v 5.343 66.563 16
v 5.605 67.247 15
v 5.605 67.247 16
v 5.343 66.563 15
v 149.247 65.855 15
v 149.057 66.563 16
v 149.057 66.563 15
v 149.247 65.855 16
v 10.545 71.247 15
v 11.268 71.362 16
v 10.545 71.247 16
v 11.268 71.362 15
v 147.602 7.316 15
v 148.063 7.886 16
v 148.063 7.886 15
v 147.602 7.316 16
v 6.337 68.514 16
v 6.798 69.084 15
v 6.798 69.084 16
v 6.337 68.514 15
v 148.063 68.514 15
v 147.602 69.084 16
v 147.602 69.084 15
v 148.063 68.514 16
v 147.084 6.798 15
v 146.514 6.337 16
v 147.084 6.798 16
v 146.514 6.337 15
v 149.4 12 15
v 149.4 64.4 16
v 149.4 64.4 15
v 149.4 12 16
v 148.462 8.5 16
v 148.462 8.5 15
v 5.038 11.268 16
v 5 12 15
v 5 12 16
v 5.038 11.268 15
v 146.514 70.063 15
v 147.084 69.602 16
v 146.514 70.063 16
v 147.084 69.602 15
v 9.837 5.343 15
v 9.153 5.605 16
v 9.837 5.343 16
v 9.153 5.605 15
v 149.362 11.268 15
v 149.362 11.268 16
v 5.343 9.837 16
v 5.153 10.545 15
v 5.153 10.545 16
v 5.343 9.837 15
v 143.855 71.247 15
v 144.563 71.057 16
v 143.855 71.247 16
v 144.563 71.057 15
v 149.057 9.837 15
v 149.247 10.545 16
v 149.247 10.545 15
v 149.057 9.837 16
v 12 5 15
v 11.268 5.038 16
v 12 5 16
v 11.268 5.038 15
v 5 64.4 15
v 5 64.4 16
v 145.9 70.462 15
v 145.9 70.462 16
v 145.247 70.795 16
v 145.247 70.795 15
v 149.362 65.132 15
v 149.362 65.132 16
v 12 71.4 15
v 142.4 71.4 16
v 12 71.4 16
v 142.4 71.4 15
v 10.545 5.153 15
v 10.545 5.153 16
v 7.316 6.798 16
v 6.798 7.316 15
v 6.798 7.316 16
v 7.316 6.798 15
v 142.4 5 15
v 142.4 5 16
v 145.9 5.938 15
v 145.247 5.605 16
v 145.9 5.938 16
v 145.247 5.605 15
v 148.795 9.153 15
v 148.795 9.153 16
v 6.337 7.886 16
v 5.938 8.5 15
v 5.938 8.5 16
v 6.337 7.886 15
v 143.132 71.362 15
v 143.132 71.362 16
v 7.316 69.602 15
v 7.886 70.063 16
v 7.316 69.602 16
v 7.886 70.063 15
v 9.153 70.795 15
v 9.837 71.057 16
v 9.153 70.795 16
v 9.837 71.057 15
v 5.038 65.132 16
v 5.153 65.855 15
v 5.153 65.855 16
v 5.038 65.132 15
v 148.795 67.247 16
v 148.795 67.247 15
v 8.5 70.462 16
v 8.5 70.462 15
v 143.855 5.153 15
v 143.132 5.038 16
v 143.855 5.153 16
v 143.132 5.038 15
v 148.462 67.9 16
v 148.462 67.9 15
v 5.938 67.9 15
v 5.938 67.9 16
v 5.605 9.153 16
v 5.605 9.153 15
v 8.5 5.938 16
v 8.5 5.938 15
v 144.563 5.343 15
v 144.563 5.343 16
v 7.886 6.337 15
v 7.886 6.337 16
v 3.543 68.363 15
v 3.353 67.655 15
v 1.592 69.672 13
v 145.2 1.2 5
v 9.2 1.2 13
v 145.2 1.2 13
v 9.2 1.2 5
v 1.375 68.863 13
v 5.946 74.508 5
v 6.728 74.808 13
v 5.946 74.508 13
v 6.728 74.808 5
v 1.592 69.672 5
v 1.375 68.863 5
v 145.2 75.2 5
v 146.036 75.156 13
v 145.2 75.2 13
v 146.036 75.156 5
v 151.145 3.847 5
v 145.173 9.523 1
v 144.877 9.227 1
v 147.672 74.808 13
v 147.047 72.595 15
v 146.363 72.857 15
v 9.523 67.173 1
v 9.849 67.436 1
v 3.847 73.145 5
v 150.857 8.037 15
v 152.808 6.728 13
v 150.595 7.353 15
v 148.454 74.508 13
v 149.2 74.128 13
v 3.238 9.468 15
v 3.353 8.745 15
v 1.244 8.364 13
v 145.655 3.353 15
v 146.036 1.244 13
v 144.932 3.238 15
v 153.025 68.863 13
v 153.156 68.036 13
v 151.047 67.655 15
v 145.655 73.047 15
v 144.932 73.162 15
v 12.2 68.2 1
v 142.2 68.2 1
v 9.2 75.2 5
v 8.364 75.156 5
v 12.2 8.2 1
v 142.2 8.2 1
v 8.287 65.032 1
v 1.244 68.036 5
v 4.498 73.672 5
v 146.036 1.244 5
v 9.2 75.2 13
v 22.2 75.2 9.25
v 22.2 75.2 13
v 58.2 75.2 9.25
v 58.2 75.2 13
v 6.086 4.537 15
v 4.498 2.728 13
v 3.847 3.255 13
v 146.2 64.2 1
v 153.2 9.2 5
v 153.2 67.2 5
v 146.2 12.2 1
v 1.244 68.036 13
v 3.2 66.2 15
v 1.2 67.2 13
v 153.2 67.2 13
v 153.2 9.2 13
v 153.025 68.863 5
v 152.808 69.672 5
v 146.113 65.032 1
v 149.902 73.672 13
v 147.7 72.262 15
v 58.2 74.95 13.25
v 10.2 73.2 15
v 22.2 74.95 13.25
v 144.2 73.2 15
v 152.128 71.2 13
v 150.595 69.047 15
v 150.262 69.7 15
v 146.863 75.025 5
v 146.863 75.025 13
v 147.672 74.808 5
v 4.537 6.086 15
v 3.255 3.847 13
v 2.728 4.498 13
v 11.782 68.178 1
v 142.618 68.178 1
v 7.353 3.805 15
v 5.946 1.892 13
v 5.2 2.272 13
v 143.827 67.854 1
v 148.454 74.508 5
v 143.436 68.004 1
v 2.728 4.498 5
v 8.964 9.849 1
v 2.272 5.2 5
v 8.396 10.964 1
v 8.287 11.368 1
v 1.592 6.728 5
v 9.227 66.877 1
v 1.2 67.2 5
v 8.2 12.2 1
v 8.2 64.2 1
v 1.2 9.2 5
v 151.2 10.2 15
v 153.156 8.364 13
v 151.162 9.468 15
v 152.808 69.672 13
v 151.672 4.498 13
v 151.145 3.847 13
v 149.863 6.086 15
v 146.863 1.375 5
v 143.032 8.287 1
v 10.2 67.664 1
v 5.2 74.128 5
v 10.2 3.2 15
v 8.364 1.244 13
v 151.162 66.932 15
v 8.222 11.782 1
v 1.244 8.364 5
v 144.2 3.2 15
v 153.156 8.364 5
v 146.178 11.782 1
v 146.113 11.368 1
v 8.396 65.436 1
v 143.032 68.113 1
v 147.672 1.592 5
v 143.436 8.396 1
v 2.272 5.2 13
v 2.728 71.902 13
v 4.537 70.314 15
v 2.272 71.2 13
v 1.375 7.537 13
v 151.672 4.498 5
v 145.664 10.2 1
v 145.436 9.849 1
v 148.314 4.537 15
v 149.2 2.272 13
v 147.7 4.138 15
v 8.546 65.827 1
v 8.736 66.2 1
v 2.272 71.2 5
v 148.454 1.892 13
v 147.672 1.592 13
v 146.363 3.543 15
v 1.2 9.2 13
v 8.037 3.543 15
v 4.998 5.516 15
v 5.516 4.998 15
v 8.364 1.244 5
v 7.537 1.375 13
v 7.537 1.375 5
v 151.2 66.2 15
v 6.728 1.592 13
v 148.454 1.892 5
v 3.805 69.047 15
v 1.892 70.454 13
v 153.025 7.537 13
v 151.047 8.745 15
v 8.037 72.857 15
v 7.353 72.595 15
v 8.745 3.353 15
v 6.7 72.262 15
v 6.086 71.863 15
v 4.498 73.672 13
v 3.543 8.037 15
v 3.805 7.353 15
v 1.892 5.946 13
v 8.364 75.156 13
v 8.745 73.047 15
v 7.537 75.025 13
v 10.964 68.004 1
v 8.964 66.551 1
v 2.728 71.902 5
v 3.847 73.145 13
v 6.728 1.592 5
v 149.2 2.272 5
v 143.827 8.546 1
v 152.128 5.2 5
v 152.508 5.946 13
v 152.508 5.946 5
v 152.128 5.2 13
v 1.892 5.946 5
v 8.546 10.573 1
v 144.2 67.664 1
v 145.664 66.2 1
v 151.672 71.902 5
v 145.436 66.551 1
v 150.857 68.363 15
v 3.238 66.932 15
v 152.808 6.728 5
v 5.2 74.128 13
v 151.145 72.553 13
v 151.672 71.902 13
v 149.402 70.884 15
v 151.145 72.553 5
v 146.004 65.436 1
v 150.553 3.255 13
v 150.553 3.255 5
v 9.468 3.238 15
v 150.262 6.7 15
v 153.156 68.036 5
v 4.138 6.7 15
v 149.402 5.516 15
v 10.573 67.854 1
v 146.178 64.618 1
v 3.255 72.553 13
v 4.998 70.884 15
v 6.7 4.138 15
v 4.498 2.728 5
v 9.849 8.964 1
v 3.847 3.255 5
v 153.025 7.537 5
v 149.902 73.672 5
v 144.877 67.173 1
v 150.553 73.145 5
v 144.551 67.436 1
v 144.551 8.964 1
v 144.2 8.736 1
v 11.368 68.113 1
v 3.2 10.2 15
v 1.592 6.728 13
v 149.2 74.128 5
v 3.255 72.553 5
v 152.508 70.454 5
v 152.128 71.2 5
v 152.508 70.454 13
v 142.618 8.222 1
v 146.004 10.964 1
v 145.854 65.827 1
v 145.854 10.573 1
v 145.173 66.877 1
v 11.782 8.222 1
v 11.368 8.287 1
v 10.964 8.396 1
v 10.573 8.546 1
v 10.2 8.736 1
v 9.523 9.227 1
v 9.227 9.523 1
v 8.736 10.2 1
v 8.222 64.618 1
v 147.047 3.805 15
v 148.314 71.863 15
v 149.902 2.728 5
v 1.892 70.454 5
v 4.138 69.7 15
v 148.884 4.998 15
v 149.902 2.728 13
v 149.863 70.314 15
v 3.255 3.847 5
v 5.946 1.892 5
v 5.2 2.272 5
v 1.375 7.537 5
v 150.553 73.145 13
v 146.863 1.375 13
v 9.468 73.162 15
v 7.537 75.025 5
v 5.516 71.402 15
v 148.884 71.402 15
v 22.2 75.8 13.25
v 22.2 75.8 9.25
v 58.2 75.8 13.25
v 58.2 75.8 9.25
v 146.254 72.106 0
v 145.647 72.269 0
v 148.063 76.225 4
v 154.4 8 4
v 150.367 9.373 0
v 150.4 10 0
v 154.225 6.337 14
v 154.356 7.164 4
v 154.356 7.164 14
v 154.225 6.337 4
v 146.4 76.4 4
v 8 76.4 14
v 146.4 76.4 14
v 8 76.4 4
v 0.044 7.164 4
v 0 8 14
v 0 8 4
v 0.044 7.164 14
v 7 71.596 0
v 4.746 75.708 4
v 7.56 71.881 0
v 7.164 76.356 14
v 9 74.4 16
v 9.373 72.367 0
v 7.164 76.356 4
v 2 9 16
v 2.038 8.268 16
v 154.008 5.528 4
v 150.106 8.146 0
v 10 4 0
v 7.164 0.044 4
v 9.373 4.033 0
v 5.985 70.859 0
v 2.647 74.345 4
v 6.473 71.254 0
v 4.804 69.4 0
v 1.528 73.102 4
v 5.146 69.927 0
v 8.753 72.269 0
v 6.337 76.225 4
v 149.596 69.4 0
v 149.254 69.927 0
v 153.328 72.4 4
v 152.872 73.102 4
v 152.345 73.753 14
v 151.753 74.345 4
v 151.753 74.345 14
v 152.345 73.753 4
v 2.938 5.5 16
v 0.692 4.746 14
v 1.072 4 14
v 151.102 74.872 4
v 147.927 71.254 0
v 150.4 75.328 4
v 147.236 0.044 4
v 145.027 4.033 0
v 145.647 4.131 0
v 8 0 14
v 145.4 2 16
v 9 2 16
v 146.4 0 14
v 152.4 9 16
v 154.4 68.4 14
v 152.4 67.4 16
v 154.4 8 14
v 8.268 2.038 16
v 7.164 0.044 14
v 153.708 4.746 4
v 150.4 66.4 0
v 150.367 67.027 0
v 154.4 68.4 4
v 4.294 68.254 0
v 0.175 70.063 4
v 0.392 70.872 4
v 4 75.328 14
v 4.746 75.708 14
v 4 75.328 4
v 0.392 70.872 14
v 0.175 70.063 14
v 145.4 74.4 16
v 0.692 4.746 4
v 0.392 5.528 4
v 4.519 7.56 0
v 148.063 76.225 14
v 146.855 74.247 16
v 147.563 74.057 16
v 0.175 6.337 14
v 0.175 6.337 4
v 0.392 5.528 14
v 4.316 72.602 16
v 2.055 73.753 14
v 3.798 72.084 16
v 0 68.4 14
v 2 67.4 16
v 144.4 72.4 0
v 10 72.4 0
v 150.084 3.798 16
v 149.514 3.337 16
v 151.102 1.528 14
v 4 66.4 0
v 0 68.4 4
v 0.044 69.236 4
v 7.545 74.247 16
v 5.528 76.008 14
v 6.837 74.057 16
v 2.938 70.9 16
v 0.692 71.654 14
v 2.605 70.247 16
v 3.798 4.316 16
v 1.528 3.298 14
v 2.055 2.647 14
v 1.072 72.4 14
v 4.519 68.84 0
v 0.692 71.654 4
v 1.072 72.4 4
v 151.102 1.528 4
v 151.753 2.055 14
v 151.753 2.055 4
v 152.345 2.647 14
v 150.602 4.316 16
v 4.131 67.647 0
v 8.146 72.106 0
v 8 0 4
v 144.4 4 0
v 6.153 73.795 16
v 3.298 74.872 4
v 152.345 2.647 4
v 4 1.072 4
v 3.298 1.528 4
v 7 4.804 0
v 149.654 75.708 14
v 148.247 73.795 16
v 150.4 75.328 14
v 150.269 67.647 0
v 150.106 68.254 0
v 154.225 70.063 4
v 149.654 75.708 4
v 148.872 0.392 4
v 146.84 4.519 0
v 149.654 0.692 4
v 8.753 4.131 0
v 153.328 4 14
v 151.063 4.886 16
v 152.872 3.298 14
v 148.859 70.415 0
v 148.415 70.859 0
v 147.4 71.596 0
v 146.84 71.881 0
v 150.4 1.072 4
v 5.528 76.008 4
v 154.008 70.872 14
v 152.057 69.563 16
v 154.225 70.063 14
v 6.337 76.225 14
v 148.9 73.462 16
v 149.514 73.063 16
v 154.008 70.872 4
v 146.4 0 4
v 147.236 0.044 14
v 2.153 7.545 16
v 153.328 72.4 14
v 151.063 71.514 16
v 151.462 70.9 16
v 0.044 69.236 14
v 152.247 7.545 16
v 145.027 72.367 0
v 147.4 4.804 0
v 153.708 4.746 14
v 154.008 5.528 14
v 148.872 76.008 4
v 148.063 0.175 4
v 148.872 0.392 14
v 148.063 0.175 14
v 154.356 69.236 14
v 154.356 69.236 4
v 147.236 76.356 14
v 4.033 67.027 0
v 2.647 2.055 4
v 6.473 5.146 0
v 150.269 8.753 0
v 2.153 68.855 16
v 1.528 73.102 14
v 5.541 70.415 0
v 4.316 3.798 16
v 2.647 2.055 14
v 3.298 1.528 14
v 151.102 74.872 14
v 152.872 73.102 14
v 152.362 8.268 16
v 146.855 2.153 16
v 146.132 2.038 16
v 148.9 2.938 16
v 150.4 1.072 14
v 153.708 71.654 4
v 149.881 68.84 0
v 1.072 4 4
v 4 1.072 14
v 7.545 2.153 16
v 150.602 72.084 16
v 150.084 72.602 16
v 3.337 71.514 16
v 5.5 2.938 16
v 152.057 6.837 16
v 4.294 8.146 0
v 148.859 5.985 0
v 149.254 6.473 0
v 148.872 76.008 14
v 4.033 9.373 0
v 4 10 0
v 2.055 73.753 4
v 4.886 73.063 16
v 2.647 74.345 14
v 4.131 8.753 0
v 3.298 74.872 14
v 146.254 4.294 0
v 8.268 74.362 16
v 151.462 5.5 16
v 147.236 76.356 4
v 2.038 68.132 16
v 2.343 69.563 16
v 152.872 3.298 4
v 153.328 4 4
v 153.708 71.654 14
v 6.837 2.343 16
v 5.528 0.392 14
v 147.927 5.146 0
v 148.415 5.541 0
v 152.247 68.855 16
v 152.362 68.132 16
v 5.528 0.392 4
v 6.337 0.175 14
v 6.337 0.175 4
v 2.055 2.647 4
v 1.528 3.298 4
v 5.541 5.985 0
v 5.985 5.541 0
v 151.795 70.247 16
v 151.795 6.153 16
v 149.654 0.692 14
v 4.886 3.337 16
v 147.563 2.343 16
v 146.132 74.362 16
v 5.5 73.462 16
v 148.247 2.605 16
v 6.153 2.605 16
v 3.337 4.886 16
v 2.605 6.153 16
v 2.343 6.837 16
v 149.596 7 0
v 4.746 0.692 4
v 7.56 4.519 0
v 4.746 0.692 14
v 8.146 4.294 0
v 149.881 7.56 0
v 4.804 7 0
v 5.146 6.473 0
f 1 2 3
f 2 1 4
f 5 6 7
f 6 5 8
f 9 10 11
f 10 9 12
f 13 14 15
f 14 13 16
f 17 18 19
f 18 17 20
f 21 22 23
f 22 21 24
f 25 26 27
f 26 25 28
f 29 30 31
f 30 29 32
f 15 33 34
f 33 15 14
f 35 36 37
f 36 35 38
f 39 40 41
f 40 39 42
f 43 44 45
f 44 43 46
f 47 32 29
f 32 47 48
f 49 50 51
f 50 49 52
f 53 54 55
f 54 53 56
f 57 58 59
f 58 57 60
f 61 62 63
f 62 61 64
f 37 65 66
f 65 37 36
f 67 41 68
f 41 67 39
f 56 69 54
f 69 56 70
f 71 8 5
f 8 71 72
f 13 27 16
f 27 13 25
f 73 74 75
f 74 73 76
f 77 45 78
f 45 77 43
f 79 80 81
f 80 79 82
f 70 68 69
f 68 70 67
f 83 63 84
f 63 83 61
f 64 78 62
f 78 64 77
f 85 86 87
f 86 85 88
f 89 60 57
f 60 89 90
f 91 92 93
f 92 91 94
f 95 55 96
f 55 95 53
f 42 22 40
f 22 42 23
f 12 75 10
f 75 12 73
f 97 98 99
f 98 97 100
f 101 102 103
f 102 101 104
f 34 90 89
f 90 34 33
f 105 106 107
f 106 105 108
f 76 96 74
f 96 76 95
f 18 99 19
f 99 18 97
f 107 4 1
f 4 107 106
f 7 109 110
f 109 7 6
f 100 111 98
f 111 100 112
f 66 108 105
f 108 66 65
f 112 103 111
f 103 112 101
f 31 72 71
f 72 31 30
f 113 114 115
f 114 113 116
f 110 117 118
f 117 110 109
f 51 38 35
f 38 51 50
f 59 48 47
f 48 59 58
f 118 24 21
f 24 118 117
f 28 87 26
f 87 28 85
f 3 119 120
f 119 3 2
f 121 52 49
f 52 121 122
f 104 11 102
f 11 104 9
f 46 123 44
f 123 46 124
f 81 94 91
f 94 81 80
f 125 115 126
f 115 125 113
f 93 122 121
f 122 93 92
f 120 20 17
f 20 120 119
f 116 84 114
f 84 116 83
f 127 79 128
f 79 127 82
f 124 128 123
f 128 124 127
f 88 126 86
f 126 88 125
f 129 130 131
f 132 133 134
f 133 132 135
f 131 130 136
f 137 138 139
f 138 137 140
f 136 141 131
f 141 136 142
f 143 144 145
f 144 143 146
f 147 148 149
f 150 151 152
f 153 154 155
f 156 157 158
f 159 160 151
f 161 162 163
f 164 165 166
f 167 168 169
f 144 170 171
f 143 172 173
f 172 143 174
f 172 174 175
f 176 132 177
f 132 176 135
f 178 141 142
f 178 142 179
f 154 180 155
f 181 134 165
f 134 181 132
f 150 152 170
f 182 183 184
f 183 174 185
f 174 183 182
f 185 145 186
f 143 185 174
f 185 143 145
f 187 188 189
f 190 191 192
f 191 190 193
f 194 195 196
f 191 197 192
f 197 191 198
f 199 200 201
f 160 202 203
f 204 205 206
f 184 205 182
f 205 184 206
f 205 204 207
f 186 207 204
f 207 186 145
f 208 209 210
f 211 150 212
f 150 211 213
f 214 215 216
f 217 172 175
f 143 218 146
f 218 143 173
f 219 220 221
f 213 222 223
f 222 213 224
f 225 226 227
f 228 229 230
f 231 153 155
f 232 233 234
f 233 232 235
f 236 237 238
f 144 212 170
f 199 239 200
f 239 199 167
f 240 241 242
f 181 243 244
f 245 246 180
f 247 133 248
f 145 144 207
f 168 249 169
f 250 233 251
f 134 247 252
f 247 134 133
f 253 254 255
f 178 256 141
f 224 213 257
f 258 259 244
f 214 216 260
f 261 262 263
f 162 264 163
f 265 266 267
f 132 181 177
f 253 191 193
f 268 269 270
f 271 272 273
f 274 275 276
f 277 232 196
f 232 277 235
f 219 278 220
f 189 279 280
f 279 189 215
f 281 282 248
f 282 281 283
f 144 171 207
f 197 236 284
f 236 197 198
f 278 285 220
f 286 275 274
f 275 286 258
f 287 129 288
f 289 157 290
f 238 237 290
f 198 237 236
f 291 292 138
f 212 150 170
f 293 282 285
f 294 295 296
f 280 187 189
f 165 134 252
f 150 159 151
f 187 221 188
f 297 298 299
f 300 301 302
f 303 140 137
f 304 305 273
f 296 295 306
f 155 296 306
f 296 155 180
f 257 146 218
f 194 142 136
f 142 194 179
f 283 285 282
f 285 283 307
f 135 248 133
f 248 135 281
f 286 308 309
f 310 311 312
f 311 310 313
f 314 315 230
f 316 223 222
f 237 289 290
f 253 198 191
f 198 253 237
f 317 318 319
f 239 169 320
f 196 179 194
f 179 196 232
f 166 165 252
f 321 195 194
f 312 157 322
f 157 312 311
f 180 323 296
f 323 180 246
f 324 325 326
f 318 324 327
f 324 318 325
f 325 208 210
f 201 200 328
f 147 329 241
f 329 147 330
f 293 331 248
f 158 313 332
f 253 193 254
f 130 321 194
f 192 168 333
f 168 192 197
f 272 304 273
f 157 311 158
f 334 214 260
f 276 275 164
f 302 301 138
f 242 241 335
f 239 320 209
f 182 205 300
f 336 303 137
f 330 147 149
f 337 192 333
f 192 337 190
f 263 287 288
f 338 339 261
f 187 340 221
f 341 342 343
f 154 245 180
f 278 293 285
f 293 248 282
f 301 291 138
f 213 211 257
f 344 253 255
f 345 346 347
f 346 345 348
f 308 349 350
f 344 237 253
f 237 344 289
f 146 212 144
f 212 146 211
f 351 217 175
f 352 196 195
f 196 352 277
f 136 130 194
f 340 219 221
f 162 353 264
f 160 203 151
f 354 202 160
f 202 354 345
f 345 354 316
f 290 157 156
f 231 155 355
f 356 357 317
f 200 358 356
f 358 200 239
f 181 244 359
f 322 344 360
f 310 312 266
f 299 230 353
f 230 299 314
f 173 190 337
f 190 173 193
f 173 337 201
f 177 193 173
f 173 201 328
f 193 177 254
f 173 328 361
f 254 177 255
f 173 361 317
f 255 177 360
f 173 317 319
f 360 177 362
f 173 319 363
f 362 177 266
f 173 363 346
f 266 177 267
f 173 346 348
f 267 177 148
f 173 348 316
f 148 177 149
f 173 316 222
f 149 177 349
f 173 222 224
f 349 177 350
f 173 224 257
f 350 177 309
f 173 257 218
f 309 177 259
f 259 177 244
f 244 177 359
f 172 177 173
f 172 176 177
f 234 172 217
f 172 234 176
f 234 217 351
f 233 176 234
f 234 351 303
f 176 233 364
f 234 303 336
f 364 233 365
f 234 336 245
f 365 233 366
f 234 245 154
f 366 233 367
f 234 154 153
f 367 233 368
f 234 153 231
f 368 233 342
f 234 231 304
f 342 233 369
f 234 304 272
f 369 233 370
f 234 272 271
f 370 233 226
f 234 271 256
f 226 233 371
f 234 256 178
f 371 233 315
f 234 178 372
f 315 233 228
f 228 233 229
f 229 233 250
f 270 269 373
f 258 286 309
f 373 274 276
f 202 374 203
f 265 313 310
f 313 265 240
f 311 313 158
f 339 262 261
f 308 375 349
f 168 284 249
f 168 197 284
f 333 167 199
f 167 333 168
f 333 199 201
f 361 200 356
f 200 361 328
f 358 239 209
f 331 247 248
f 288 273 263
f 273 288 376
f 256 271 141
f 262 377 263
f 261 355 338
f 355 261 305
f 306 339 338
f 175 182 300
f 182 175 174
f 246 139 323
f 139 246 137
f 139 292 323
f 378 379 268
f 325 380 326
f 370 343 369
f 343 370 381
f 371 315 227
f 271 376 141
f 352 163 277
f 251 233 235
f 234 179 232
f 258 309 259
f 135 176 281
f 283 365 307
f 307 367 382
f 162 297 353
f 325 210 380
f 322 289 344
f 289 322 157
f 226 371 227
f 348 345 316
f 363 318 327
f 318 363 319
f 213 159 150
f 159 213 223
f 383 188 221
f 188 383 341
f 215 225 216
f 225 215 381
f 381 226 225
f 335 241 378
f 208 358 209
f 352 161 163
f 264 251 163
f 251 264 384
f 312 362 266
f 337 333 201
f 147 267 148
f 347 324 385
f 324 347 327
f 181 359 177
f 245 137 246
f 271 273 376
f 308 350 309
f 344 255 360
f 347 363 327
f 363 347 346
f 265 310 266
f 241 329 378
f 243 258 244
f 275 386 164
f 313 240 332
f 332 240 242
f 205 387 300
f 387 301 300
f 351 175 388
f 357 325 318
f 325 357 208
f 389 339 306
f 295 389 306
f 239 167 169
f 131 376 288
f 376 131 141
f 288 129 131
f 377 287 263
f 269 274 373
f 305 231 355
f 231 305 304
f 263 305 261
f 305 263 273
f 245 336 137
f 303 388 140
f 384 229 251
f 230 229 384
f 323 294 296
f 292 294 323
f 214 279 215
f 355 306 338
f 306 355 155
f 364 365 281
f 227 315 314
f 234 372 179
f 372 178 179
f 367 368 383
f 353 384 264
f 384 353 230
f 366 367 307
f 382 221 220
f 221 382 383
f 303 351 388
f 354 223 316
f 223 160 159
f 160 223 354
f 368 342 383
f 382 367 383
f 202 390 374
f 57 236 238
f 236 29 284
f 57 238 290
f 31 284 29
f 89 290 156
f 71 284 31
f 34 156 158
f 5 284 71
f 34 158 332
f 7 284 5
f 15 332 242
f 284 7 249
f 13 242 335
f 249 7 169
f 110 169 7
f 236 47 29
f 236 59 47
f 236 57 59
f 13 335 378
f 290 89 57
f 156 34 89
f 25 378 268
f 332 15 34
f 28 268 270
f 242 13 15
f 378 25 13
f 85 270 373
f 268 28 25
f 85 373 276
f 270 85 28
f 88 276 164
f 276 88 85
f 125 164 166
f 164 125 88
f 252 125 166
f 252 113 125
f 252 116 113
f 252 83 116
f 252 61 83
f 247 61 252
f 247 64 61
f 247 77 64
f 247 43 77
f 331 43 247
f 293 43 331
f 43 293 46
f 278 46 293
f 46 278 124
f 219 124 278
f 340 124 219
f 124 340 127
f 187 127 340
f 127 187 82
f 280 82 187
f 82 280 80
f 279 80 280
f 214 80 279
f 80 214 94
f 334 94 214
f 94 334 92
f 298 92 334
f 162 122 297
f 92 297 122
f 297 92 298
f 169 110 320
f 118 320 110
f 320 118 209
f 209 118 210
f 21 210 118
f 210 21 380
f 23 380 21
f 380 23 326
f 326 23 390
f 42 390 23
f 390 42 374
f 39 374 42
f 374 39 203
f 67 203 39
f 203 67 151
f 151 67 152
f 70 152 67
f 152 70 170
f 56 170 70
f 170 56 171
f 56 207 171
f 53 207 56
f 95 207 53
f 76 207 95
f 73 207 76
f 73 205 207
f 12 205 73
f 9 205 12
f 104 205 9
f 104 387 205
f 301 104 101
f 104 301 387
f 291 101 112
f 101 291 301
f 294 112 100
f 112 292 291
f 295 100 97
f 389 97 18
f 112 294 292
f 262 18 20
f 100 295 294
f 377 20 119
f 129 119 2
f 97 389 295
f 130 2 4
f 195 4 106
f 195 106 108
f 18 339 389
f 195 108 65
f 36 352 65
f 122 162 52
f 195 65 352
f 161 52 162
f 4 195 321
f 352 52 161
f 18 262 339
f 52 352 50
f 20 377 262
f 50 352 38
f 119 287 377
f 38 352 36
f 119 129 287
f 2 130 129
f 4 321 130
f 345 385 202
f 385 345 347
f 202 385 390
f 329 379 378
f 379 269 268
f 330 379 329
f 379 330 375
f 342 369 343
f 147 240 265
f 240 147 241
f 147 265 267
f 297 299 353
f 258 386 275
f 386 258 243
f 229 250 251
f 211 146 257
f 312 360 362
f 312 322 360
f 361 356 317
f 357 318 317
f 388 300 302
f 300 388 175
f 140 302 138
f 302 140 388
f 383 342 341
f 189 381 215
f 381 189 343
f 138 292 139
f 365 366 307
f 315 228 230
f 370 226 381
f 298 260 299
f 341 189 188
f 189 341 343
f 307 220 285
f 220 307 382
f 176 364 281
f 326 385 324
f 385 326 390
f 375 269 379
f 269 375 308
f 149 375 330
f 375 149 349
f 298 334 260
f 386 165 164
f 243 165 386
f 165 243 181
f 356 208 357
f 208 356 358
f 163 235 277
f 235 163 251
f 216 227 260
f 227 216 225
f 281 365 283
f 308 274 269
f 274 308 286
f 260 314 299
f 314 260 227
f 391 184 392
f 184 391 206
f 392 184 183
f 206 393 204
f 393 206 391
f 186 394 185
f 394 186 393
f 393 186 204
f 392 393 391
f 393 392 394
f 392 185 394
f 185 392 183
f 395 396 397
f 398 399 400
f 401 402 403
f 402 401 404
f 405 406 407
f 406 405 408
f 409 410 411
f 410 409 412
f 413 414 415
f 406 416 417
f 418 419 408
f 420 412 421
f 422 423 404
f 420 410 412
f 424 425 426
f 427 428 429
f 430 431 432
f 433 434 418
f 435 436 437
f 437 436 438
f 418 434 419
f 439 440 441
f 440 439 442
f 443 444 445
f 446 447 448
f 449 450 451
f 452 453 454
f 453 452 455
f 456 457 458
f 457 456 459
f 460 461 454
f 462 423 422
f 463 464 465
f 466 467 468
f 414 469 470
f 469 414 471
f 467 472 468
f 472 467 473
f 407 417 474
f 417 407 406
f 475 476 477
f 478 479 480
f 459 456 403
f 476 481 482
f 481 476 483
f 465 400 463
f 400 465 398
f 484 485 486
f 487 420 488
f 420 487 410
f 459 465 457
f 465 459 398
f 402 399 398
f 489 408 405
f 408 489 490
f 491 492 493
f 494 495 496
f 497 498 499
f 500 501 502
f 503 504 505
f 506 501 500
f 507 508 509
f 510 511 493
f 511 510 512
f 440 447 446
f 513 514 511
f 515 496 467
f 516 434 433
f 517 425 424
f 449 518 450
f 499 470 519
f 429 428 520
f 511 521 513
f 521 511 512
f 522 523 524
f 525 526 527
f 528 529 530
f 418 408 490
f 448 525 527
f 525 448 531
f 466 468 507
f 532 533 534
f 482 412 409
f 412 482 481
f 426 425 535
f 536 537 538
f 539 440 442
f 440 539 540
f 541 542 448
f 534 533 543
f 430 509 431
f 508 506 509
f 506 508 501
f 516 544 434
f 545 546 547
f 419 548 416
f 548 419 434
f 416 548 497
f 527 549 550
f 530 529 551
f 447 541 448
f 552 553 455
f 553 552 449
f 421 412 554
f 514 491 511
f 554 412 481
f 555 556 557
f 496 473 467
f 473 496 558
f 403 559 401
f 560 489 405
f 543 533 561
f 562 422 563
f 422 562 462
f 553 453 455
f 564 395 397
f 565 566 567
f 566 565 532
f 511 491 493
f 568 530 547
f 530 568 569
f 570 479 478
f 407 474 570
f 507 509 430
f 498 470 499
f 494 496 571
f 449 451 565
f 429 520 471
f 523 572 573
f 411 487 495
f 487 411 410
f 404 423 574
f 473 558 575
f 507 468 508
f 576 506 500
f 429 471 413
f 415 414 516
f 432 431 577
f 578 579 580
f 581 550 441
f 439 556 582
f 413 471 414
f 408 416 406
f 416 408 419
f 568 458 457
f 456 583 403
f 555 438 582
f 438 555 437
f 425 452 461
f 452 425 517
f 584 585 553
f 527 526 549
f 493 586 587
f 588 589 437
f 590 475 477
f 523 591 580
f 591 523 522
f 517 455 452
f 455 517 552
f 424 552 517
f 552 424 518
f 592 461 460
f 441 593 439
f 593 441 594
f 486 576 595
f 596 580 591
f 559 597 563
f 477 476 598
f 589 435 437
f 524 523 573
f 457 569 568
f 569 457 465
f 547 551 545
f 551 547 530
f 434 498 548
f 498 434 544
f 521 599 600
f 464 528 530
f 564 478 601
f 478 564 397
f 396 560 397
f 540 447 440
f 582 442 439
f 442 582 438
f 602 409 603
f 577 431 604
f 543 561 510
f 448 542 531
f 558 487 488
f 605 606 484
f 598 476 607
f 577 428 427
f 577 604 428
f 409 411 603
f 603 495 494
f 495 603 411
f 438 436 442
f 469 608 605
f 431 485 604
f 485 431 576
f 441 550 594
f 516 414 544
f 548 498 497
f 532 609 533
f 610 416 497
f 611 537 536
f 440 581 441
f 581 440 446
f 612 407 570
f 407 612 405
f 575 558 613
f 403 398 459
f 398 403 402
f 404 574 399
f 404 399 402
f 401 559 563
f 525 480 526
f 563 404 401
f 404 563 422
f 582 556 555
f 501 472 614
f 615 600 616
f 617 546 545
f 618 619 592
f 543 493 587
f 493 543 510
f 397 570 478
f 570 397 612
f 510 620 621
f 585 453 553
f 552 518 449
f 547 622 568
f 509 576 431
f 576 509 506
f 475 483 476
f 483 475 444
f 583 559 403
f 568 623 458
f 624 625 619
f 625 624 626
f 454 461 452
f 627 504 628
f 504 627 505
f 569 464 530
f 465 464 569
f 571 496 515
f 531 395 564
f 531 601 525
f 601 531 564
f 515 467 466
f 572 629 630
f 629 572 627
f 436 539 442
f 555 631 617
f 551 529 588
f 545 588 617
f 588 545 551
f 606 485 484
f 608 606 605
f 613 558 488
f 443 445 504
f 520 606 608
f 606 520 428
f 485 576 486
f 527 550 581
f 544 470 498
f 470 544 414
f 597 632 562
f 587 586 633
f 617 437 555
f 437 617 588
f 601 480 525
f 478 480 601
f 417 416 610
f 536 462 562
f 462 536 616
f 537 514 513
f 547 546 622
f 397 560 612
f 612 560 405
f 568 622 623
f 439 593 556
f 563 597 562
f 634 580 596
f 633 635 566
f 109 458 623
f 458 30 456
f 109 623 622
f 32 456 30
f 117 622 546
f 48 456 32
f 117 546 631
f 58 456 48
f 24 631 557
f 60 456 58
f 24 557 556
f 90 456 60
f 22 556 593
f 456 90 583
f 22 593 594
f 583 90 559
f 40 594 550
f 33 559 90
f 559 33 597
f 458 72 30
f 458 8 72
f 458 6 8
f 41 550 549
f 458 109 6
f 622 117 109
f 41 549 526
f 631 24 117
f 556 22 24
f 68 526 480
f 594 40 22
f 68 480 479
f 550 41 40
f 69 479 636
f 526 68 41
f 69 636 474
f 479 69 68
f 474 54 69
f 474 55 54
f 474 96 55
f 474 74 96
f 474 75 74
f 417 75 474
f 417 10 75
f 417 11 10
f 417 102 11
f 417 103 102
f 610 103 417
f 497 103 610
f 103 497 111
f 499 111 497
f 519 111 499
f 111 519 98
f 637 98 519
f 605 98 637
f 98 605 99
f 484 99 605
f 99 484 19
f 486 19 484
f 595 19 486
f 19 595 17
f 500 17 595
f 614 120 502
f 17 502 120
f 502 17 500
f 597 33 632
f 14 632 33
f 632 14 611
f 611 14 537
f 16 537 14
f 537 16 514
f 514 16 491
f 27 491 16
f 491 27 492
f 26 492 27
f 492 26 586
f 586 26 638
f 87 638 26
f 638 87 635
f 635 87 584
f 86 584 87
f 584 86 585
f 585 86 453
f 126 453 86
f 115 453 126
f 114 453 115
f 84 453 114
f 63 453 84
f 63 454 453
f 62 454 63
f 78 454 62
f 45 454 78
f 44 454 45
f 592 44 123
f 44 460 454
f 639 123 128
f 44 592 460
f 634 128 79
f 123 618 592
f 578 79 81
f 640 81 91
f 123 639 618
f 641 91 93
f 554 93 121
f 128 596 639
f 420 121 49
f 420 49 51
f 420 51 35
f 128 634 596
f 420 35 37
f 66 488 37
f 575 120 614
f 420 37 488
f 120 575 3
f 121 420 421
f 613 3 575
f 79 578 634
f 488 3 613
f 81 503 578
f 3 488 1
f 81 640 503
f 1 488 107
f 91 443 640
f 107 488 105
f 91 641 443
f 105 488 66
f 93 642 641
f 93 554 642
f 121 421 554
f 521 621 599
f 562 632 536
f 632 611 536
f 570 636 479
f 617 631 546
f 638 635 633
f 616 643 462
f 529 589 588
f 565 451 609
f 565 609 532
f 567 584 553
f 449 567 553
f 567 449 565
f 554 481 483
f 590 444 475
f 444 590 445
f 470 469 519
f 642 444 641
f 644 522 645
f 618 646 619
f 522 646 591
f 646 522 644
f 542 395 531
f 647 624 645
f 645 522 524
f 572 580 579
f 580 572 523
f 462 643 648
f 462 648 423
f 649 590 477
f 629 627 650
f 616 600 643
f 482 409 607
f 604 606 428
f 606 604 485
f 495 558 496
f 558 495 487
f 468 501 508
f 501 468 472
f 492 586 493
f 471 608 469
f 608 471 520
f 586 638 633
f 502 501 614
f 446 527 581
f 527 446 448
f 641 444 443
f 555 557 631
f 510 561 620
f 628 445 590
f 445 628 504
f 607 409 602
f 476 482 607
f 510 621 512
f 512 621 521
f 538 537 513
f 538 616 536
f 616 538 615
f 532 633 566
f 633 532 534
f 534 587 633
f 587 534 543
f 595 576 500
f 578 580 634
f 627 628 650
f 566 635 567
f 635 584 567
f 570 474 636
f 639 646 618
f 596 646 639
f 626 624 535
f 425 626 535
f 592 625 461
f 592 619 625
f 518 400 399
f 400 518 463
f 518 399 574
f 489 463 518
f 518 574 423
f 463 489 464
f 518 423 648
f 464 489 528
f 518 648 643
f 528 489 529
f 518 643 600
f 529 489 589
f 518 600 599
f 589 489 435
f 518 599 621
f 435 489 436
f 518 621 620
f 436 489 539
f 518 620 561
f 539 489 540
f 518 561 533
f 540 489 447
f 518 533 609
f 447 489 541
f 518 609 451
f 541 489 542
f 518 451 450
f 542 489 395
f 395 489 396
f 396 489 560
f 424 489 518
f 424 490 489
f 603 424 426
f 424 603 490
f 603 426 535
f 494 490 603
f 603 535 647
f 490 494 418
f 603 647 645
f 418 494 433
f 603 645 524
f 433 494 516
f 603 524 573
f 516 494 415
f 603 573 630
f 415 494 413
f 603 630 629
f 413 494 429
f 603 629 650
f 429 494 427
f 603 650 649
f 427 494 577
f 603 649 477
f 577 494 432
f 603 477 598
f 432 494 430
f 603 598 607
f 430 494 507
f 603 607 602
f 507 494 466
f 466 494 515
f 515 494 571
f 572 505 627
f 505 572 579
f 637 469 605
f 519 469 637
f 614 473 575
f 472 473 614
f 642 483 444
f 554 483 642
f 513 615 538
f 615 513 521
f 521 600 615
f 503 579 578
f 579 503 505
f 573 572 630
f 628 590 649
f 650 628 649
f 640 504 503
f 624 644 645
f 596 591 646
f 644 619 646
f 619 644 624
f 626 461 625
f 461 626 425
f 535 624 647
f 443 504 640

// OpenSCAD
// file: PhoneOutline.scad
//
// Copyright (C) 2020 Purism SPC
//
// SPDX-License-Identifier: GPL-3.0+
//

// slim needs to be defined before including this file

// Phone Dimensions
pX = (evergreen == 1) ? 153-slim : 150-slim;
pY = 75-slim;
pZ = 15-slim;

module phone() {
    $fn=60;
    r=8;

    hull() {
    //Main phone
    translate([r,r,4])
        cylinder(h=pZ-6, r=r);
    translate([r,pY-r,4])
        cylinder(h=pZ-6, r=r);
    translate([pX-r,pY-r,4])
        cylinder(h=pZ-6, r=r);
    translate([pX-r,r,4])
        cylinder(h=pZ-6, r=r);
    
    // back bezel
    // h = 4
    // d = 4
    offsetB = r+3;
    translate([offsetB,offsetB,0])
        cylinder(h=4, r=r-4);
    translate([offsetB, pY-offsetB,0])
        cylinder(h=4, r=r-4);
    translate([pX-offsetB,pY-offsetB,0])
        cylinder(h=4, r=r-4);
    translate([pX-offsetB,offsetB,0])
        cylinder(h=4, r=r-4);
        
    // top bezel
    // h = 2 
    // d = 1
    offsetT = r+1;
    translate([offsetT,offsetT,pZ-2])
        cylinder(h=2, r=r-1);
    translate([offsetT, pY-offsetT,pZ-2])
        cylinder(h=2, r=r-1);
    translate([pX-offsetT,pY-offsetT,pZ-2])
        cylinder(h=2, r=r-1);
    translate([pX-offsetT,offsetT,pZ-2])
        cylinder(h=2, r=r-1);
    }
}

// phone();
// main file
//
// Copyright (C) 2020 Purism SPC
//
// SPDX-License-Identifier: GPL-3.0+
//

// Configuration options
evergreen = 1; // 0 for dogwood case
slim = 1; // default to bumper case
raingear = 1; // 1 don't add any cutouts

include <PhoneOutline.scad>;

// Case thickness
cX = (slim == 0) ? 3.5 : 1.2;
cY = (slim == 0) ? 2.5 : 1.2;
cZ = (slim == 0) ? 2 : 1;

// Case outside Dimesions
oY = pY+2*cY;
oX = pX+2*cX;
oZ = pZ+2*cZ;

$fn=60;
r=8;
 
module case_base() {
    
    hull() {
    //Main Case
    translate([r,r,4])
        cylinder(h=oZ-6, r=r);
    translate([r,oY-r,4])
        cylinder(h=oZ-6, r=r);
    translate([oX-r,oY-r,4])
        cylinder(h=oZ-6, r=r);
    translate([oX-r,r,4])
        cylinder(h=oZ-6, r=r);
    
    // back bezel
    // h = 4
    // d = 4
    bO = r+2;
    translate([bO,bO,0])
        cylinder(h=4, r=r-2);
    translate([bO, oY-bO,0])
        cylinder(h=4, r=r-2);
    translate([oX-bO,oY-bO,0])
        cylinder(h=4, r=r-2);
    translate([oX-bO,bO,0])
        cylinder(h=4, r=r-2);
        
    // top bezel
    // h = 2 
    // d = 1
    tO = r+1;
    translate([tO,tO,oZ-2])
        cylinder(h=2, r=r-1);
    translate([tO, oY-tO,oZ-2])
        cylinder(h=2, r=r-1);
    translate([oX-tO,oY-tO,oZ-2])
        cylinder(h=2, r=r-1);
    translate([oX-tO,tO,oZ-2])
        cylinder(h=2, r=r-1);
    }
}

module display_cut() {
    hull() {
    offset = r+4;
    translate([offset,offset,oZ-3])
        cylinder(h=4, r=r-1);
    translate([offset, oY-offset,oZ-3])
        cylinder(h=4, r=r-1);
    translate([oX-offset,oY-offset,oZ-3])
        cylinder(h=4, r=r-1);
    translate([oX-offset,offset,oZ-3])
        cylinder(h=4, r=r-1);
    }
}

module camera_cuts() {
    // Camera
    translate([13.5+cX,49.5+cY,-cZ/2])
        cylinder(h=2*cZ, r1=6, r2=4);
    // Flash
    translate([13.5+cX,37.5+cY,-cZ/2])
        scale([2.5,1,1])
        cylinder(h=2*cZ, r1=4, r2=1.5);
}

module hks_cut() {
    hull() {
    translate([cX+24, -cY/2, cZ+7.25])
        cube([34, cY*2, 5]);
    // bezel edge
    translate([cX+22, -cY, cZ+6.25])
        cube([38, cY, 7]);
    }
}

module vol_cut() {
    d = (raingear == 0) ? cY*2 : cY;
    hull() {
    translate([cX+21, pY+cY-cY/2, cZ+8.25])
        cube([36, d, 4]);
    // bezel edge
    if (raingear == 0)
        translate([cX+18, pY+2*cY, cZ+7.25])
            cube([42, cY, 6]);
    }
}

module top_cuts() {
    // Headphone plug
    translate([-cX, cY+19, cZ+10])
        rotate([0, 90, 0])
            cylinder(h=cX*4, r1=5, r2=4);
}

module bottom_cuts() {
    // Mic
    translate([pX+cX/2, pY/2-20+cY, cZ+8.5])
        cube([cX*2, 10, 3]);
    // Speaker
    translate([pX+cX/2, pY/2+10+cY, cZ+8.5])
        cube([cX*2, 10, 3]);
    // USB C
    cutY1=14;
    translate([pX+cX/2, pY/2-cutY1/2+cY, cZ+6.5])
        cube([cX*2, cutY1, 7]);
}

module case() {
    difference() {
        case_base();
        union() {
            display_cut();
            translate([cX, cY, cZ]) phone();
            vol_cut();
            if (raingear == 0 ) {
                camera_cuts();
                hks_cut();
                top_cuts();
                bottom_cuts();
            }
        }
    }
}


case();

//translate([cX, cY, cZ]) color("red") phone();
